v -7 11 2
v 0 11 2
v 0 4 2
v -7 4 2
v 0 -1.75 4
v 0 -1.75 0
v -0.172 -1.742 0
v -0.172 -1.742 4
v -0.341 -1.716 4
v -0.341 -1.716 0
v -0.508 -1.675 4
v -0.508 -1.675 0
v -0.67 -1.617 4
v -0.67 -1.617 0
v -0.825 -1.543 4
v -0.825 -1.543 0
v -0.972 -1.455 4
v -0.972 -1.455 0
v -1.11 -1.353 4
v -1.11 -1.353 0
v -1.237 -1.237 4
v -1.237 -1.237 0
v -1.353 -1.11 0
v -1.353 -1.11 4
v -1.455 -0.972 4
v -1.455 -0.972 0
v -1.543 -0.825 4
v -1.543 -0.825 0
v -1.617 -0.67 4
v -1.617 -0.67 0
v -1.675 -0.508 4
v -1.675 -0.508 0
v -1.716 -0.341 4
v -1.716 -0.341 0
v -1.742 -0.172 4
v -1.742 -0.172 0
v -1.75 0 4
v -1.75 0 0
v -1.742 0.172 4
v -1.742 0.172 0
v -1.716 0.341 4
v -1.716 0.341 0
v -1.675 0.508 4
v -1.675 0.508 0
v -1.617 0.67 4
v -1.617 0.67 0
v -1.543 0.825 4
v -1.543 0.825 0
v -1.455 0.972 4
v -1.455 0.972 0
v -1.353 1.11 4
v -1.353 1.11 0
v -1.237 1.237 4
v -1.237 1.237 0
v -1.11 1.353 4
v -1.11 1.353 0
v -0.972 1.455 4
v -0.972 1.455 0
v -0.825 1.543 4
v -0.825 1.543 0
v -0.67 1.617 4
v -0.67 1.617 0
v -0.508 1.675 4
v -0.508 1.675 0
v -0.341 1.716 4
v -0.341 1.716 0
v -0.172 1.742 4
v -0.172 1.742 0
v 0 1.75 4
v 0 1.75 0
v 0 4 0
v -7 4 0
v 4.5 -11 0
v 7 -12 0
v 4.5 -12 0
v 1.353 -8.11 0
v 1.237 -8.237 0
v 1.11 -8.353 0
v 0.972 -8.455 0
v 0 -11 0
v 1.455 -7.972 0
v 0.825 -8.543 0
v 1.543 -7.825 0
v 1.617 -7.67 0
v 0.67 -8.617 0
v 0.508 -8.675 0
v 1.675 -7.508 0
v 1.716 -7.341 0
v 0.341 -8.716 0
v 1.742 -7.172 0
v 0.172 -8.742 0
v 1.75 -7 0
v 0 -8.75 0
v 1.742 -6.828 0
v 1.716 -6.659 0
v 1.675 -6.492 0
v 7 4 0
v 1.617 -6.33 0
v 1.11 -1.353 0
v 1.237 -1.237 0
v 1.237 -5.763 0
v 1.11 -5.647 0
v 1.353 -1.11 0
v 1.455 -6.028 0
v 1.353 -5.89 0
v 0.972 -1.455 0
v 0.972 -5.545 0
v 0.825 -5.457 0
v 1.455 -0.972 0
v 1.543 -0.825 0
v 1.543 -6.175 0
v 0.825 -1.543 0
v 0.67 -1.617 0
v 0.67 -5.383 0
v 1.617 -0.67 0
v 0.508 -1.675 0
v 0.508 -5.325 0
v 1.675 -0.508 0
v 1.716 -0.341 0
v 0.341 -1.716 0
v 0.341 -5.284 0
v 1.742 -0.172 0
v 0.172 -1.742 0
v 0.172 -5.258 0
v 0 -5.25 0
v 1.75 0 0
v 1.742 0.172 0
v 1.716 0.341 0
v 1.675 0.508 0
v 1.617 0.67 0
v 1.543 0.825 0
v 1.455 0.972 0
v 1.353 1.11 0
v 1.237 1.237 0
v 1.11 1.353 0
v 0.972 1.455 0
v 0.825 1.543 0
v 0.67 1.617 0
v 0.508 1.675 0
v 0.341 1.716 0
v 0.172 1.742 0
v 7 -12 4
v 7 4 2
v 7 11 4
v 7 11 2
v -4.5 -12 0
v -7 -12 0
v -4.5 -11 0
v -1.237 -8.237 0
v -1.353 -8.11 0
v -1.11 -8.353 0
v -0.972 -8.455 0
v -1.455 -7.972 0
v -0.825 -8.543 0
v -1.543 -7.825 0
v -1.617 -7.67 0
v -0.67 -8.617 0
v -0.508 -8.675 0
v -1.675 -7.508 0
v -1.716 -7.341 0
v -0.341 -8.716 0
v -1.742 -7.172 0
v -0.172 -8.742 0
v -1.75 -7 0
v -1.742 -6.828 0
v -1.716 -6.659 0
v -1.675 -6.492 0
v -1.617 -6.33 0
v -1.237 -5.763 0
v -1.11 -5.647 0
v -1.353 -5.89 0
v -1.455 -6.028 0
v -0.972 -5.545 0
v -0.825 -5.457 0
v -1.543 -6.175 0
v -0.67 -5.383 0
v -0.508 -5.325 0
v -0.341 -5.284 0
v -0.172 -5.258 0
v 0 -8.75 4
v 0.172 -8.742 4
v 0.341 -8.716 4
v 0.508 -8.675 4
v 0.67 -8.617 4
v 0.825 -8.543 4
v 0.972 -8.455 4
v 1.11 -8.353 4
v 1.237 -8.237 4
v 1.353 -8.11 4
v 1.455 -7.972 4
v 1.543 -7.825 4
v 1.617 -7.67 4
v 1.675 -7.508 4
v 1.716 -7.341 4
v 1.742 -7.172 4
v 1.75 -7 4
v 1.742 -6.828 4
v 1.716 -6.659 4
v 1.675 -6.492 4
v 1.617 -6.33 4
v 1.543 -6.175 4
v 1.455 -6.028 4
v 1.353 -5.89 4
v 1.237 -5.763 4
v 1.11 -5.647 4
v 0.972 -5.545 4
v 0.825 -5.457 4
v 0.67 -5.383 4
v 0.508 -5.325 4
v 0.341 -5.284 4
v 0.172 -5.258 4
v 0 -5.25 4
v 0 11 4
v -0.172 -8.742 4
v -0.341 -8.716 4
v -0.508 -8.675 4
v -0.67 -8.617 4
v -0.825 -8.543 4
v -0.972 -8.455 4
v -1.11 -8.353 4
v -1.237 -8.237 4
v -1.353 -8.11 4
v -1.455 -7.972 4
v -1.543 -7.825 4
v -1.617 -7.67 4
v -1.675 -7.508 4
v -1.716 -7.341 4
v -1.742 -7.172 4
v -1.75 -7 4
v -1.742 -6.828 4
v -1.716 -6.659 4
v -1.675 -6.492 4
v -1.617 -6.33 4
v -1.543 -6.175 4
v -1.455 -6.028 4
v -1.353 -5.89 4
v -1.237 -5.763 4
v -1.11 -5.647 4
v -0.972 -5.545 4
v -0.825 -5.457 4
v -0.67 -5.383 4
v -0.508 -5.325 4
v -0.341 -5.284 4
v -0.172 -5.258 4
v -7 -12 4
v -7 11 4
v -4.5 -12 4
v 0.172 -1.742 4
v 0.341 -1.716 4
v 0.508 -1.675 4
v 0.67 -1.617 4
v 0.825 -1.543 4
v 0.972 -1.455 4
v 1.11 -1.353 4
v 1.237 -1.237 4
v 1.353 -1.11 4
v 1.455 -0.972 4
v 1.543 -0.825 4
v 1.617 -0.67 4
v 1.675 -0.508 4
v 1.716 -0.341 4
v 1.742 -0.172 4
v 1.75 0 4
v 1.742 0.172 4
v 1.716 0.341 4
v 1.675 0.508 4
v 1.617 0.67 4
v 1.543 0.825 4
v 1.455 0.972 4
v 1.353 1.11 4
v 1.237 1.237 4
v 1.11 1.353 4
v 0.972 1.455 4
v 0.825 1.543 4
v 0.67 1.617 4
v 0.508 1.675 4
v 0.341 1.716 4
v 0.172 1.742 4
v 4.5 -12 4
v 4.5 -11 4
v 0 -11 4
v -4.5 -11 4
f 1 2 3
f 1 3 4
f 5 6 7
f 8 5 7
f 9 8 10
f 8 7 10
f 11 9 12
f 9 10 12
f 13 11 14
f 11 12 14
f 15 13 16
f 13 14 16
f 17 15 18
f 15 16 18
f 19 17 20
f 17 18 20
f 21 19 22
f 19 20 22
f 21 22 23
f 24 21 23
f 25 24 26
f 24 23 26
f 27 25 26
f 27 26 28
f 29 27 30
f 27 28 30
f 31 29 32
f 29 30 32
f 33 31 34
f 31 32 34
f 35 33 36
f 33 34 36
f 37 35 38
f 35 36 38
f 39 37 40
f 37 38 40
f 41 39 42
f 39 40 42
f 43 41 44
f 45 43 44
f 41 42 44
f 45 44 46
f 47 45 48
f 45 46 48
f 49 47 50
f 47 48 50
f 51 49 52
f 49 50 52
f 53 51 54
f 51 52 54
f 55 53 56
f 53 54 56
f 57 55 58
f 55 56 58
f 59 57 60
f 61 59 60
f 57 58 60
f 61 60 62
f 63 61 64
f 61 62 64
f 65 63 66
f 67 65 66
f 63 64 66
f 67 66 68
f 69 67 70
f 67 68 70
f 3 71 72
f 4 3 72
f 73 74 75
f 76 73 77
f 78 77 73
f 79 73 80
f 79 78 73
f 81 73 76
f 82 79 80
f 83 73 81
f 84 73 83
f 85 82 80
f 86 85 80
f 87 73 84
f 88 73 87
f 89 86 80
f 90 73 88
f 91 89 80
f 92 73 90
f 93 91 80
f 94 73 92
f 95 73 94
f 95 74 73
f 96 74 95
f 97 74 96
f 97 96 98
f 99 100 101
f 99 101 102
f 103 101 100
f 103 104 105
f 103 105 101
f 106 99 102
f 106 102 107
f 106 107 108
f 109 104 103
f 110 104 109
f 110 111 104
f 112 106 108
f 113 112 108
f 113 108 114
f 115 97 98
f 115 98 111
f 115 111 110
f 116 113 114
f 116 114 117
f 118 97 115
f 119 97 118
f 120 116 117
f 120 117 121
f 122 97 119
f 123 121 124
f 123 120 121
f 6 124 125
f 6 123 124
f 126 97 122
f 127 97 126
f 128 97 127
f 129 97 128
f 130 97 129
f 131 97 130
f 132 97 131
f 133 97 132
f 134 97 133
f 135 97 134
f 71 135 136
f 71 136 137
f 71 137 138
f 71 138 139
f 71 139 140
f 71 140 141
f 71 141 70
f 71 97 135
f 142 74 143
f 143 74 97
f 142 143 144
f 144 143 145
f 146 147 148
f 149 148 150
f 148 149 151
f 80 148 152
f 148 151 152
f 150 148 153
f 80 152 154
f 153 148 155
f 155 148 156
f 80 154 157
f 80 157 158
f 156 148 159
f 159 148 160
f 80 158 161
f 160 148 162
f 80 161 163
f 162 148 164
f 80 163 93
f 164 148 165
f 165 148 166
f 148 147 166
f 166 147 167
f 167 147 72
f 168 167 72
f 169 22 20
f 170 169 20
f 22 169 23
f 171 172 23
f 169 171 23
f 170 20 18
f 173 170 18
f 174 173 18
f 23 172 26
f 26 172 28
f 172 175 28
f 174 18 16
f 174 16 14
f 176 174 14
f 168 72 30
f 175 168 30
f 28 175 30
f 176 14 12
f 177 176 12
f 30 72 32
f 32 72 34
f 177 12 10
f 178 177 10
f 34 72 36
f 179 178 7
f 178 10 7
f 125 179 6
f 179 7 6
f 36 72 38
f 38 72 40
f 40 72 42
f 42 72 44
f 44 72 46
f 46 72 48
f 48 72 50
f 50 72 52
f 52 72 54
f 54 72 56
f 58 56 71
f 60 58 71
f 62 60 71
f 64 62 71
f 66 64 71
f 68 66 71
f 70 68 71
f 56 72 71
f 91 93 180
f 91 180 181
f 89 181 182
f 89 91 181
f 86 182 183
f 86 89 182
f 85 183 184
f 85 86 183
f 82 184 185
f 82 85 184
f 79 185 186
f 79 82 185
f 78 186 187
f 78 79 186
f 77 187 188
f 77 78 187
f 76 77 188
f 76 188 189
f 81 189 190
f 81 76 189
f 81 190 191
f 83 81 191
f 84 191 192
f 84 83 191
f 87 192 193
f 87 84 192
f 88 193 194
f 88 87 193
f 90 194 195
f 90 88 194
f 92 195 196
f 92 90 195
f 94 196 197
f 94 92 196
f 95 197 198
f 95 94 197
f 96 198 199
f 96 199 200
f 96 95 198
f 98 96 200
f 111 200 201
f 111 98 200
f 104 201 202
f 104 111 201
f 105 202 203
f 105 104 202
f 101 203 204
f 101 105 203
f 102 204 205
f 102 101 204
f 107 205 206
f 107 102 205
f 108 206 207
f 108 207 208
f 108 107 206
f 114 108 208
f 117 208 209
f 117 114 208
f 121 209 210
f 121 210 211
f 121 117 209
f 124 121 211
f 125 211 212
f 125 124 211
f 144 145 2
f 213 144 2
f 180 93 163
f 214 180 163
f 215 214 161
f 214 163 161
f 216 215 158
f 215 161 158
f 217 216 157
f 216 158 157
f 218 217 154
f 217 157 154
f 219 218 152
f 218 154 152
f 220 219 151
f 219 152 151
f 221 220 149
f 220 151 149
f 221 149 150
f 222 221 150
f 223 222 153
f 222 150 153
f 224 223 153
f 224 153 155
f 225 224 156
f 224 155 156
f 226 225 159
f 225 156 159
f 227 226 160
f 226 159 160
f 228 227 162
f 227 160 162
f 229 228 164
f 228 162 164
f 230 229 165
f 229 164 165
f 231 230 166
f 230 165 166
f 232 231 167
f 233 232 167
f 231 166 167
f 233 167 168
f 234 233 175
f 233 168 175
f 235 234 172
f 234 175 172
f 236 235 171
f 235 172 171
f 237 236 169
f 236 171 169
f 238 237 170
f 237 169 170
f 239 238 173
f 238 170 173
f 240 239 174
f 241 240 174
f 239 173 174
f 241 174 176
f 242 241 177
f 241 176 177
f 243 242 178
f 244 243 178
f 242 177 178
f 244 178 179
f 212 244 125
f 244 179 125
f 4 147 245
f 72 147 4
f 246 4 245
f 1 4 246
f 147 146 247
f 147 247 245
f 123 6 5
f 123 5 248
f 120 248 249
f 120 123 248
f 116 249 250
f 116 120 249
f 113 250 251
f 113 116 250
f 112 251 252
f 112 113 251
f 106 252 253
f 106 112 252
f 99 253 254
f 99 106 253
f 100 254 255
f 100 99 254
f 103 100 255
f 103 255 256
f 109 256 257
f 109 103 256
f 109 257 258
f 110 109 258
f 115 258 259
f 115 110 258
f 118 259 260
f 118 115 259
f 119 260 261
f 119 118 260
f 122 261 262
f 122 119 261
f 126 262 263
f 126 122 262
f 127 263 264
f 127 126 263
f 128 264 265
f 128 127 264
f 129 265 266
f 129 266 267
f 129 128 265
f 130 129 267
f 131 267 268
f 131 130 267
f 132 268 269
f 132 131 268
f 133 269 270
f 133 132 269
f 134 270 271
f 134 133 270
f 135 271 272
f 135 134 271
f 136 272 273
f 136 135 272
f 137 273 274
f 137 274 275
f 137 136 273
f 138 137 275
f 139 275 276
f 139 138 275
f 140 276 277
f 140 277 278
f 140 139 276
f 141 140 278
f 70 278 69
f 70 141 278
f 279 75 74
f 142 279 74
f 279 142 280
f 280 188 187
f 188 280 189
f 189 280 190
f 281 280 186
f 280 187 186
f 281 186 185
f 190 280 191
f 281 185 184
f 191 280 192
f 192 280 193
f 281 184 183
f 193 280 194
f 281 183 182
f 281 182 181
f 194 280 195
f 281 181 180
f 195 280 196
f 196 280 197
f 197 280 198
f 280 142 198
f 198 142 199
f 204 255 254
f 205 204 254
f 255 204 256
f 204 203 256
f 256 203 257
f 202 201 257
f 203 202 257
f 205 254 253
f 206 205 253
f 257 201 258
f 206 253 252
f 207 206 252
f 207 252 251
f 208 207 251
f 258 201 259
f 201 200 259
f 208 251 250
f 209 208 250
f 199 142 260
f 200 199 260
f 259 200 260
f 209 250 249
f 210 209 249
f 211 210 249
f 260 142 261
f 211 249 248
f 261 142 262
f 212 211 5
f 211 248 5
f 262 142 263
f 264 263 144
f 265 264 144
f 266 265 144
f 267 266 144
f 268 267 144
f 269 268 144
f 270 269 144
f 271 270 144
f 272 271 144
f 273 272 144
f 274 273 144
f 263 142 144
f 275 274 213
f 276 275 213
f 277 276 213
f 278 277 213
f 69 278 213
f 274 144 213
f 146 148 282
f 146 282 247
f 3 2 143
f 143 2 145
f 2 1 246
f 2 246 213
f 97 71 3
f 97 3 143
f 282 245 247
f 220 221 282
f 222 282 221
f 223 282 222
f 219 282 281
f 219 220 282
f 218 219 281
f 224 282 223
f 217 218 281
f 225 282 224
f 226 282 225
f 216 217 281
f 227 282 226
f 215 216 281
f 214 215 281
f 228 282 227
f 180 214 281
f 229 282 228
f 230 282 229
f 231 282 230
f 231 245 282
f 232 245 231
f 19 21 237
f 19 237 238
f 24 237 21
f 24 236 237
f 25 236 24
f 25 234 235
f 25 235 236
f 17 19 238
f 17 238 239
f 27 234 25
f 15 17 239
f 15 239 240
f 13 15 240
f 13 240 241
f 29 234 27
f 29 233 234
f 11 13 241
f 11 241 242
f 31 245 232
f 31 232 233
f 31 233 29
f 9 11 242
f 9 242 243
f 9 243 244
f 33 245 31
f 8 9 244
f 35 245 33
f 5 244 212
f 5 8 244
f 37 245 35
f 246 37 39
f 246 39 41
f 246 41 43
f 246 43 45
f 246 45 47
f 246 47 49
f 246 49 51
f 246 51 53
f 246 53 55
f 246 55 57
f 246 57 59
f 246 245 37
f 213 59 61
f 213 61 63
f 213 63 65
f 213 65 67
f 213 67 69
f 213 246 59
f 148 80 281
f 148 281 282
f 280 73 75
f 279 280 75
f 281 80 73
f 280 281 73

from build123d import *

# Parameters (mm, degrees)
PAD_DEPTH    = 4
SKETCH001_W  = 7
SKETCH001_H  = 7
POCKET_DEPTH = 2


with BuildPart() as part:
    # Sketch → Pad (new body)
    with BuildSketch(Plane.XY):
        with BuildLine():
            ThreePointArc((0, -1.75), (1.75, 0), (0, 1.75))
            Line((0, 11), (0, 1.75))
            Line((7, 11), (0, 11))
            Line((7, -12), (7, 11))
            Line((4.5, -12), (7, -12))
            Line((4.5, -11), (4.5, -12))
            Line((0, -11), (4.5, -11))
            Line((0, -8.75), (0, -11))
            ThreePointArc((0, -8.75), (1.75, -7), (0, -5.25))
            Line((0, -5.25), (0, -1.75))
        make_face()
    pad = extrude(amount=PAD_DEPTH)

    # Sketch001 → Pocket (cut)
    with BuildSketch(Plane.XY):
        with Locations((3.5, 7.5)):
            Rectangle(SKETCH001_W, SKETCH001_H)
    pocket = extrude(amount=POCKET_DEPTH, mode=Mode.SUBTRACT)

    # Mirrored: Pad, Pocket across Sketch V_Axis
    add(pad.mirror(Plane(origin=(0, 0, 0), x_dir=(0, 0, 1), z_dir=(1, 0, 0))))
    add(pocket.mirror(Plane(origin=(0, 0, 0), x_dir=(0, 0, 1), z_dir=(1, 0, 0))), mode=Mode.SUBTRACT)


solid = part.part
